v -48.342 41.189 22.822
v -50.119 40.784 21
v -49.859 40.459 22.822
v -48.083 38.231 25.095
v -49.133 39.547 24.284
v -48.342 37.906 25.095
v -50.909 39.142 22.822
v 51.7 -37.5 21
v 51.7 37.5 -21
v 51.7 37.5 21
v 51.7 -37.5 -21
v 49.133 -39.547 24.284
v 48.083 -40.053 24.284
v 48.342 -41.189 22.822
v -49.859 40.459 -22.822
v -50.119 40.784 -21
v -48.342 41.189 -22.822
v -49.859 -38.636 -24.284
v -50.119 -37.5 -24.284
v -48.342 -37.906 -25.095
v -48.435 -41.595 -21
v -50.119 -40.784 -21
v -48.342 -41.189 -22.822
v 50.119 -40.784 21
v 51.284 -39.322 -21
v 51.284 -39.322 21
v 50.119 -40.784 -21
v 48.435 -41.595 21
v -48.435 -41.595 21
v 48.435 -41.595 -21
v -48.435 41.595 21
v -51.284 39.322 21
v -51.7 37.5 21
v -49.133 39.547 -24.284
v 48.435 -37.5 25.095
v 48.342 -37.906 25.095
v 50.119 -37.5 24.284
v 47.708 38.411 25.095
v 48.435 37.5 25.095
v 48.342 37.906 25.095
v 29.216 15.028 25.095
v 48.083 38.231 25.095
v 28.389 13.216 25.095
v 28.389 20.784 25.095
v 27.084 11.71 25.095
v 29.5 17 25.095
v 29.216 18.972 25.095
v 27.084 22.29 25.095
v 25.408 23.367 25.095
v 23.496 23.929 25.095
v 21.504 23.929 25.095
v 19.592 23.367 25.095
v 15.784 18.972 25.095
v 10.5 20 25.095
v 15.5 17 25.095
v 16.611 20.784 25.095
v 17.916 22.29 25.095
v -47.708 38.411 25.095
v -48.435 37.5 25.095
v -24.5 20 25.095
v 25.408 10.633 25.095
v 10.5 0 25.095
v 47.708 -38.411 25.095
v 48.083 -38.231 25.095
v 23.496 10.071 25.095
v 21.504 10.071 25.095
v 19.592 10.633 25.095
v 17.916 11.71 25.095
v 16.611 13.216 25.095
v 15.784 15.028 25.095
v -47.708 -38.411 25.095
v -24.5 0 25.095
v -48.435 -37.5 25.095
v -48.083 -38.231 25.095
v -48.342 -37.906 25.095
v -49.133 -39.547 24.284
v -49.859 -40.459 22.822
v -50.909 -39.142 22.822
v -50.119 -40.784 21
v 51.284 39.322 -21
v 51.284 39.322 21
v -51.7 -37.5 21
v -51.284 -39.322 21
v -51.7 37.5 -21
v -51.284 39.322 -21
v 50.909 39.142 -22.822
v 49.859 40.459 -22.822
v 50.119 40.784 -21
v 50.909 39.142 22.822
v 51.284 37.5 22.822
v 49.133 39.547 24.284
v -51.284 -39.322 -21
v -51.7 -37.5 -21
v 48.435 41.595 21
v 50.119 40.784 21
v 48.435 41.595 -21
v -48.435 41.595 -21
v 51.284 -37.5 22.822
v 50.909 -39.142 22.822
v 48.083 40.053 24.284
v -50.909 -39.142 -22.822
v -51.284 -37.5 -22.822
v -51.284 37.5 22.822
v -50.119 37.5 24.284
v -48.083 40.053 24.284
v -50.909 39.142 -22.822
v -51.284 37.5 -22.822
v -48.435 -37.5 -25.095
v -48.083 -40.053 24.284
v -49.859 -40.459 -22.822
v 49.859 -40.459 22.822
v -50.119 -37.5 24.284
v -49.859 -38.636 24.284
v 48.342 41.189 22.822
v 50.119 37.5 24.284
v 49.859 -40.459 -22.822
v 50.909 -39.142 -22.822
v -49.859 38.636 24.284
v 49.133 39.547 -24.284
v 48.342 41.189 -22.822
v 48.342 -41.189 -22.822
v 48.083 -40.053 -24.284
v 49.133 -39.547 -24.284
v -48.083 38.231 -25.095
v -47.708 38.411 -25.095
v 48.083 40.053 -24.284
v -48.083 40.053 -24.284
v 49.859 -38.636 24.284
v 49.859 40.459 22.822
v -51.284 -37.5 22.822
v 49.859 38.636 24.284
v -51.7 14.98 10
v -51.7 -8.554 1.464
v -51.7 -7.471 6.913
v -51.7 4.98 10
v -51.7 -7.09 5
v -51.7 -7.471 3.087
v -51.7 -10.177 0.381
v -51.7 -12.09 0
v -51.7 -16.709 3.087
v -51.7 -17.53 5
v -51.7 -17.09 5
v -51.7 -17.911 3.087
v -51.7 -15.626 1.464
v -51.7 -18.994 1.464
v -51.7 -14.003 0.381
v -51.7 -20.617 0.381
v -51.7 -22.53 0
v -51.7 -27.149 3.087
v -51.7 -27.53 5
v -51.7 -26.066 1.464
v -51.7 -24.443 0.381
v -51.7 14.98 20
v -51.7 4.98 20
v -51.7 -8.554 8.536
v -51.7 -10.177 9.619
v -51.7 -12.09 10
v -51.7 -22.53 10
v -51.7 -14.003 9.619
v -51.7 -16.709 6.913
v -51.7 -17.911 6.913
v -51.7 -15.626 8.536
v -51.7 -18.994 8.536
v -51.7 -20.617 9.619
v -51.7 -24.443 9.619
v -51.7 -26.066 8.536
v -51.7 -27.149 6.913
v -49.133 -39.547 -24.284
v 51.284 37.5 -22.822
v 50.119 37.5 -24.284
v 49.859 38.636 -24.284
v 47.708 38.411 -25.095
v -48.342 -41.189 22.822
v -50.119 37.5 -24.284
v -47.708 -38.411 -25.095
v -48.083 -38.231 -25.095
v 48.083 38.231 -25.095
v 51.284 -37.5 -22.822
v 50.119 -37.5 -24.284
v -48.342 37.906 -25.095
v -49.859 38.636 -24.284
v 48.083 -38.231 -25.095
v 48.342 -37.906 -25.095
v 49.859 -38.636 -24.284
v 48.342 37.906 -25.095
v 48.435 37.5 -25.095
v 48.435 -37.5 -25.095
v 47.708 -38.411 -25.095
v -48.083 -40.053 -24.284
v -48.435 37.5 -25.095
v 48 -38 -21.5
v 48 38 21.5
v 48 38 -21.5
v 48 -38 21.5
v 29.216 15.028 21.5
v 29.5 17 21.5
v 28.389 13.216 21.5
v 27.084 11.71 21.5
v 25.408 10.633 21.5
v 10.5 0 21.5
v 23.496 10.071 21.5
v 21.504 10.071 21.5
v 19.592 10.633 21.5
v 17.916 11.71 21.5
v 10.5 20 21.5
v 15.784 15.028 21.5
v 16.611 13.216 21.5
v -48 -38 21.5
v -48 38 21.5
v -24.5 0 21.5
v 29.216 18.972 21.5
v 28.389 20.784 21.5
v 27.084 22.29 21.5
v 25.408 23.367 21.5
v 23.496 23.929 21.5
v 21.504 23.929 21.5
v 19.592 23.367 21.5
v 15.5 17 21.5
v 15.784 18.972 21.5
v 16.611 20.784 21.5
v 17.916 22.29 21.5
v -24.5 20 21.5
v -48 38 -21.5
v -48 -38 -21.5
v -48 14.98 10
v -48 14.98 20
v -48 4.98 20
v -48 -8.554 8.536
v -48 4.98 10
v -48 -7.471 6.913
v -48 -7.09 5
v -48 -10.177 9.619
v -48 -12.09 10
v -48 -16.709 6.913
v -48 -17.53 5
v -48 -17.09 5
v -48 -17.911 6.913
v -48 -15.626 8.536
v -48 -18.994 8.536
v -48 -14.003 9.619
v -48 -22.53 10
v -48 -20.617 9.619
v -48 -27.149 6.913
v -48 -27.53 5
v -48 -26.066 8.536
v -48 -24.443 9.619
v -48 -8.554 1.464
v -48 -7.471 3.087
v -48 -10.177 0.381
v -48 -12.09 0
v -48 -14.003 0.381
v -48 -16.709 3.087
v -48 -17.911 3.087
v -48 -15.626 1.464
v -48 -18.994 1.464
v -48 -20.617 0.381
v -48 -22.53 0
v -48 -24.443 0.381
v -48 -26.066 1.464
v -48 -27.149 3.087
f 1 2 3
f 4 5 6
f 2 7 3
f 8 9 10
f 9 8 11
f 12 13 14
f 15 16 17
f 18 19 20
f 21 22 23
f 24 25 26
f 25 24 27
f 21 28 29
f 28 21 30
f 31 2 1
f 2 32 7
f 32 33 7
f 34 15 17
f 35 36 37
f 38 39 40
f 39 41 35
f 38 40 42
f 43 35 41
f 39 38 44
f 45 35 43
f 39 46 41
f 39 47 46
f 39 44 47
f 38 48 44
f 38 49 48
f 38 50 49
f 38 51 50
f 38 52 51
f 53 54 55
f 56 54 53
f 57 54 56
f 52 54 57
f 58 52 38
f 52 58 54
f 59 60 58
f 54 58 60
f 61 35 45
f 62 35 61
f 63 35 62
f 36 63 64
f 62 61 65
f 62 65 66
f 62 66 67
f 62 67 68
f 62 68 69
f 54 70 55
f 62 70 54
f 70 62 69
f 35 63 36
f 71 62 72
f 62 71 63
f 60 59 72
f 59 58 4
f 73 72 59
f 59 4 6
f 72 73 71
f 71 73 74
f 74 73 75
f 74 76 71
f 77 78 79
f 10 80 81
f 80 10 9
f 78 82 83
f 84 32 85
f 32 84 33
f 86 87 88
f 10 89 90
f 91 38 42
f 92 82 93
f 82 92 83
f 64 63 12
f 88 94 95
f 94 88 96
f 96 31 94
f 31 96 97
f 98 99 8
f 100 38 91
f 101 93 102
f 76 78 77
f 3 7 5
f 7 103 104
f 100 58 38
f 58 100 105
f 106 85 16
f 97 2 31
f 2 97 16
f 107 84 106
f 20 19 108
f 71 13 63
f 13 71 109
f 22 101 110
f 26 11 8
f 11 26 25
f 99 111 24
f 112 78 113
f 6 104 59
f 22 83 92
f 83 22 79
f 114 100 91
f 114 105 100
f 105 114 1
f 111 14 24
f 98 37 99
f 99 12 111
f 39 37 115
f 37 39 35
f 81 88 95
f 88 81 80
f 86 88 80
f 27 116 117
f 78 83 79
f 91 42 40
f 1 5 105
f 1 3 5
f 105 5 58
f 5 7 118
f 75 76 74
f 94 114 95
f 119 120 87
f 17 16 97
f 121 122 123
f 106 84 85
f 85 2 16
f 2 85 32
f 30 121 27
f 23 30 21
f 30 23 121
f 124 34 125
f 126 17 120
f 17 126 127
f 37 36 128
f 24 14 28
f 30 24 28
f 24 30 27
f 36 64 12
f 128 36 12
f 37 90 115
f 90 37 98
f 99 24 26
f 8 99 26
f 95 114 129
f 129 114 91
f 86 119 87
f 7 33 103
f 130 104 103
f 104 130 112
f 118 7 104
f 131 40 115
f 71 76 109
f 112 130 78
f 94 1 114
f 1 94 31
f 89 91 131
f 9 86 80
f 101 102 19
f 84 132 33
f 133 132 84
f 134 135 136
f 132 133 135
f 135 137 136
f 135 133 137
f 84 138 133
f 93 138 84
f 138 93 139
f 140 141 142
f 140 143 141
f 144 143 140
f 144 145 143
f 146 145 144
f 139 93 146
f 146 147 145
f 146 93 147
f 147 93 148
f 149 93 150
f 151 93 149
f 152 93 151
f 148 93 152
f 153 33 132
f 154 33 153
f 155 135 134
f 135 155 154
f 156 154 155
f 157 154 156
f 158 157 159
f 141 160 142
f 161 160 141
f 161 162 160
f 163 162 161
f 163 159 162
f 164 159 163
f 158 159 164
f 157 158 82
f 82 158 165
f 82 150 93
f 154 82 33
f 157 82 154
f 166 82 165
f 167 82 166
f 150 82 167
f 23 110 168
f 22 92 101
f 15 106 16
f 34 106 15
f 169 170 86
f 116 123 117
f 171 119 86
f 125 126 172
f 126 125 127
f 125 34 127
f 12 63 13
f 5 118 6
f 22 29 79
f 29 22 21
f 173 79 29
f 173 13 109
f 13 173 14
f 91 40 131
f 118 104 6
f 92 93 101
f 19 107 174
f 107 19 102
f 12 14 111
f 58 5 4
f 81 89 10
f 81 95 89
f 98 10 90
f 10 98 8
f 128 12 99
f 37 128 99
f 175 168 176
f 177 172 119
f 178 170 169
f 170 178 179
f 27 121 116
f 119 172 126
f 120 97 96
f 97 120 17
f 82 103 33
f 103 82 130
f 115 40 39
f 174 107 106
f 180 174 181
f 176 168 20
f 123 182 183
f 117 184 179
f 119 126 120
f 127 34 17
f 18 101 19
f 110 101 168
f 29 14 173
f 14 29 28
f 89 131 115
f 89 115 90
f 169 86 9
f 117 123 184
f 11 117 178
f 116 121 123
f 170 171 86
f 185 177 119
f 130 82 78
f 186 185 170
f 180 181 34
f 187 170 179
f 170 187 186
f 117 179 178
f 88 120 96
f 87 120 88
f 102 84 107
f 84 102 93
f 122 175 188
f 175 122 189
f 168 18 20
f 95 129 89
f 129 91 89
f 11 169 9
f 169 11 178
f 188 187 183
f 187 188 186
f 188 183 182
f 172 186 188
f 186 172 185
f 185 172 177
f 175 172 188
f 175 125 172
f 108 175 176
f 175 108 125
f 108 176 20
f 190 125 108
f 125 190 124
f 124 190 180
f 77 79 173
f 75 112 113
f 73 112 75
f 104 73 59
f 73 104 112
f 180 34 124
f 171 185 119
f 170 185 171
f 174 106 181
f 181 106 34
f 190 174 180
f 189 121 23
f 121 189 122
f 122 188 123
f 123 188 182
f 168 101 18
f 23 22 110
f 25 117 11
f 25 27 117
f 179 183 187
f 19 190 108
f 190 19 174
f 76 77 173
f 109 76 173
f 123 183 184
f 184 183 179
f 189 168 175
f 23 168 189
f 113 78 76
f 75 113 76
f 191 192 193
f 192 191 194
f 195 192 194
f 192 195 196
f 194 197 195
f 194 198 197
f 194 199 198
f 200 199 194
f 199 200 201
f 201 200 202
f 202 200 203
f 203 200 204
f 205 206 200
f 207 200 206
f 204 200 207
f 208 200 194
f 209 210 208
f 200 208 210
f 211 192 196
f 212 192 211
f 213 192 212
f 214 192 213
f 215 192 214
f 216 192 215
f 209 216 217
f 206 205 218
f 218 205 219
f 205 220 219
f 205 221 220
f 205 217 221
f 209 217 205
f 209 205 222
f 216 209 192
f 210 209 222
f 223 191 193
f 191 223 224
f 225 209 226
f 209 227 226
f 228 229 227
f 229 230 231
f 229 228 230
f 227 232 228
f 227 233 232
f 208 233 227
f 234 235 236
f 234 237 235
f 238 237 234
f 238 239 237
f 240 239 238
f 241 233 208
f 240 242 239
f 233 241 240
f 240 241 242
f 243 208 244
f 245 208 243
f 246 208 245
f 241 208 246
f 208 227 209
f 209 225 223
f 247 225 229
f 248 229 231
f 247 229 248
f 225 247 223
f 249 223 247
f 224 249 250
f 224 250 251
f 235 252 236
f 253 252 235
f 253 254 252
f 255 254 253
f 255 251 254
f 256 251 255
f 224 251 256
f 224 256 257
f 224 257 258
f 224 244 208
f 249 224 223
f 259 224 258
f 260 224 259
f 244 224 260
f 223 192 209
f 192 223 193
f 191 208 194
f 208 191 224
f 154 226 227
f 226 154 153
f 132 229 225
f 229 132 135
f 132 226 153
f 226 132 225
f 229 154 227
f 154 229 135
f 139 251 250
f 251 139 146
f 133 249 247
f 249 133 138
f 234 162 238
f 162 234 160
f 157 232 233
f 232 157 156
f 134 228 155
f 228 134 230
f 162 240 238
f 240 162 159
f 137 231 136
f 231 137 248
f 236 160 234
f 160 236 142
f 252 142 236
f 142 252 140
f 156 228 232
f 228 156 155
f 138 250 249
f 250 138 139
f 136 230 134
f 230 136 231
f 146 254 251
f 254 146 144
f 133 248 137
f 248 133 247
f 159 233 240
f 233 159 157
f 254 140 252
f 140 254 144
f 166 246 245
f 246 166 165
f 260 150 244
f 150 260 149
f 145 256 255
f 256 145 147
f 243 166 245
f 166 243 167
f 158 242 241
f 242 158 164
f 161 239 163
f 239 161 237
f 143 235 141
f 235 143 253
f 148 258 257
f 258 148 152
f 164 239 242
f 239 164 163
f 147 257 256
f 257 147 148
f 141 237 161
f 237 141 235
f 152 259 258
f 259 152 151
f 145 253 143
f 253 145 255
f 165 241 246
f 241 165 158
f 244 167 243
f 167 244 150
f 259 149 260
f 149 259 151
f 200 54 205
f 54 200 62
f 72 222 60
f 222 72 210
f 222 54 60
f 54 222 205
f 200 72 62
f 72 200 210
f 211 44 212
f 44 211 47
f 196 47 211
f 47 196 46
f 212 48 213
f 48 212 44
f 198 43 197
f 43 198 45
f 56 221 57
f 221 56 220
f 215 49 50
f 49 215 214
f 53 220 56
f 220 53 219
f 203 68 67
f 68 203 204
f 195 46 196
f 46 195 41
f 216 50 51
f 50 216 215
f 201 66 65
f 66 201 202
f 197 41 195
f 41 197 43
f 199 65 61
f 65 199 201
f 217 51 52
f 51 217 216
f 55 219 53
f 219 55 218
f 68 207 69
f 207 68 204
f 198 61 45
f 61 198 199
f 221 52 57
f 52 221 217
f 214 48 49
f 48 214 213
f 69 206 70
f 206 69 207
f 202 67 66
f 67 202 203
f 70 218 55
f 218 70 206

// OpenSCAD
/* This module constructs the main body of the enclosure. First, we name the module: */

// box size overall
l = 95; // x dim
w = 75; // y dim
h = 42; // z dim



// button 1
button1_radius = 5; //mm
button1_y = -12.09;
button1_z = 5;

// button 2
button2_radius = button1_radius;
button2_y = -22.53;
button2_z = button1_z;

// mic
mic_radius = 7;
mic_x = 22.5;
mic_y = 17;

// usb opening
usb_y = 9.98;
usb_dy = 10;
usb_z = 15;
usb_dz = 10;

//screen
screen_x = -7; //x position of center of screen
screen_y = 10; //y position of center of screen
screen_dx = 35; //length of screen (x dim)
screen_dy = 20; //

module enclosure() {

/* Next, we call the difference function. This specifies that we will be subtracting the second object we call from the first. We will use this to make our cube hollow. */

difference() {

/* The first object will be our main cube. to give the cube rounded edges, we call minkowski, which will trace the shape we specify around the edges. We will use a sphere, so that the hard edges of the cube will take on the shape of the sphere. */

minkowski()
{

/* Lastly, I am calling difference again here because I wanted to add a small indentation to the bottom of the cube so that it would be more comfortable to hold. Again, difference subtracts the second object from the first, so here, we see a cube; and then an offset (translated), smaller cube(); */

difference()
{
//cube([60,40,15], center=true);
//translate([-15,-10,-8])
//cube([30,20,1.5]);
    
cube([l,w,h], center=true);
//translate([-l/4,-w/4,-h/2])
//cube([l/2,w/2,h/10]);
};

/* Having constructed the main box, we can now specify the size of the sphere that we will use to round the edges. */

sphere(h/10);
};

/* Having specified our main enclosure body with rounded edges and an indentation on the bottom, we finally hollow it out. */

cube([l+1,w+1,h+1], center=true);
}
}

module enclosureHoles() {

/* This section of the code constructs all of the independent holes and joins them into a uniform object. */

union() {

// USB
    
translate([-l,usb_y-usb_dy/2,usb_z-usb_dz/2])
cube([w, usb_dy, usb_dz]);
    
    
// button #1
translate([0,button1_y,button1_z])
rotate([0,-90,0])
cylinder(r=button1_radius, h=100*l);

// button #2
translate([0,button2_y,button2_z])
rotate([0,-90,0])
cylinder(r=button2_radius, h=100*l);
    
// Screen
translate([screen_x-screen_dx/2,screen_y-screen_dy/2,h/2])
cube([screen_dx, screen_dy, 5]);


// mic
//translate([mic_x,mic_y,w/2])
translate([mic_x,mic_y,0])
cylinder(r=mic_radius, h=h*10);

}
}

module concat() {

difference() {
enclosure();
enclosureHoles();
}
}

concat();

/* To actually print, we’ll need to render it in two separate halves which we will attach later. So, comment out the above concat() command and instead run the below code to render the top only */

difference() {
concat();
translate([0,0,-8.5])
cube([65,44,2], center=true);
}

/* then, comment the above out and run the following code to render the bottom only */

difference() {
concat();
translate([0,0,2])
cube([65,44,16], center=true);
}
